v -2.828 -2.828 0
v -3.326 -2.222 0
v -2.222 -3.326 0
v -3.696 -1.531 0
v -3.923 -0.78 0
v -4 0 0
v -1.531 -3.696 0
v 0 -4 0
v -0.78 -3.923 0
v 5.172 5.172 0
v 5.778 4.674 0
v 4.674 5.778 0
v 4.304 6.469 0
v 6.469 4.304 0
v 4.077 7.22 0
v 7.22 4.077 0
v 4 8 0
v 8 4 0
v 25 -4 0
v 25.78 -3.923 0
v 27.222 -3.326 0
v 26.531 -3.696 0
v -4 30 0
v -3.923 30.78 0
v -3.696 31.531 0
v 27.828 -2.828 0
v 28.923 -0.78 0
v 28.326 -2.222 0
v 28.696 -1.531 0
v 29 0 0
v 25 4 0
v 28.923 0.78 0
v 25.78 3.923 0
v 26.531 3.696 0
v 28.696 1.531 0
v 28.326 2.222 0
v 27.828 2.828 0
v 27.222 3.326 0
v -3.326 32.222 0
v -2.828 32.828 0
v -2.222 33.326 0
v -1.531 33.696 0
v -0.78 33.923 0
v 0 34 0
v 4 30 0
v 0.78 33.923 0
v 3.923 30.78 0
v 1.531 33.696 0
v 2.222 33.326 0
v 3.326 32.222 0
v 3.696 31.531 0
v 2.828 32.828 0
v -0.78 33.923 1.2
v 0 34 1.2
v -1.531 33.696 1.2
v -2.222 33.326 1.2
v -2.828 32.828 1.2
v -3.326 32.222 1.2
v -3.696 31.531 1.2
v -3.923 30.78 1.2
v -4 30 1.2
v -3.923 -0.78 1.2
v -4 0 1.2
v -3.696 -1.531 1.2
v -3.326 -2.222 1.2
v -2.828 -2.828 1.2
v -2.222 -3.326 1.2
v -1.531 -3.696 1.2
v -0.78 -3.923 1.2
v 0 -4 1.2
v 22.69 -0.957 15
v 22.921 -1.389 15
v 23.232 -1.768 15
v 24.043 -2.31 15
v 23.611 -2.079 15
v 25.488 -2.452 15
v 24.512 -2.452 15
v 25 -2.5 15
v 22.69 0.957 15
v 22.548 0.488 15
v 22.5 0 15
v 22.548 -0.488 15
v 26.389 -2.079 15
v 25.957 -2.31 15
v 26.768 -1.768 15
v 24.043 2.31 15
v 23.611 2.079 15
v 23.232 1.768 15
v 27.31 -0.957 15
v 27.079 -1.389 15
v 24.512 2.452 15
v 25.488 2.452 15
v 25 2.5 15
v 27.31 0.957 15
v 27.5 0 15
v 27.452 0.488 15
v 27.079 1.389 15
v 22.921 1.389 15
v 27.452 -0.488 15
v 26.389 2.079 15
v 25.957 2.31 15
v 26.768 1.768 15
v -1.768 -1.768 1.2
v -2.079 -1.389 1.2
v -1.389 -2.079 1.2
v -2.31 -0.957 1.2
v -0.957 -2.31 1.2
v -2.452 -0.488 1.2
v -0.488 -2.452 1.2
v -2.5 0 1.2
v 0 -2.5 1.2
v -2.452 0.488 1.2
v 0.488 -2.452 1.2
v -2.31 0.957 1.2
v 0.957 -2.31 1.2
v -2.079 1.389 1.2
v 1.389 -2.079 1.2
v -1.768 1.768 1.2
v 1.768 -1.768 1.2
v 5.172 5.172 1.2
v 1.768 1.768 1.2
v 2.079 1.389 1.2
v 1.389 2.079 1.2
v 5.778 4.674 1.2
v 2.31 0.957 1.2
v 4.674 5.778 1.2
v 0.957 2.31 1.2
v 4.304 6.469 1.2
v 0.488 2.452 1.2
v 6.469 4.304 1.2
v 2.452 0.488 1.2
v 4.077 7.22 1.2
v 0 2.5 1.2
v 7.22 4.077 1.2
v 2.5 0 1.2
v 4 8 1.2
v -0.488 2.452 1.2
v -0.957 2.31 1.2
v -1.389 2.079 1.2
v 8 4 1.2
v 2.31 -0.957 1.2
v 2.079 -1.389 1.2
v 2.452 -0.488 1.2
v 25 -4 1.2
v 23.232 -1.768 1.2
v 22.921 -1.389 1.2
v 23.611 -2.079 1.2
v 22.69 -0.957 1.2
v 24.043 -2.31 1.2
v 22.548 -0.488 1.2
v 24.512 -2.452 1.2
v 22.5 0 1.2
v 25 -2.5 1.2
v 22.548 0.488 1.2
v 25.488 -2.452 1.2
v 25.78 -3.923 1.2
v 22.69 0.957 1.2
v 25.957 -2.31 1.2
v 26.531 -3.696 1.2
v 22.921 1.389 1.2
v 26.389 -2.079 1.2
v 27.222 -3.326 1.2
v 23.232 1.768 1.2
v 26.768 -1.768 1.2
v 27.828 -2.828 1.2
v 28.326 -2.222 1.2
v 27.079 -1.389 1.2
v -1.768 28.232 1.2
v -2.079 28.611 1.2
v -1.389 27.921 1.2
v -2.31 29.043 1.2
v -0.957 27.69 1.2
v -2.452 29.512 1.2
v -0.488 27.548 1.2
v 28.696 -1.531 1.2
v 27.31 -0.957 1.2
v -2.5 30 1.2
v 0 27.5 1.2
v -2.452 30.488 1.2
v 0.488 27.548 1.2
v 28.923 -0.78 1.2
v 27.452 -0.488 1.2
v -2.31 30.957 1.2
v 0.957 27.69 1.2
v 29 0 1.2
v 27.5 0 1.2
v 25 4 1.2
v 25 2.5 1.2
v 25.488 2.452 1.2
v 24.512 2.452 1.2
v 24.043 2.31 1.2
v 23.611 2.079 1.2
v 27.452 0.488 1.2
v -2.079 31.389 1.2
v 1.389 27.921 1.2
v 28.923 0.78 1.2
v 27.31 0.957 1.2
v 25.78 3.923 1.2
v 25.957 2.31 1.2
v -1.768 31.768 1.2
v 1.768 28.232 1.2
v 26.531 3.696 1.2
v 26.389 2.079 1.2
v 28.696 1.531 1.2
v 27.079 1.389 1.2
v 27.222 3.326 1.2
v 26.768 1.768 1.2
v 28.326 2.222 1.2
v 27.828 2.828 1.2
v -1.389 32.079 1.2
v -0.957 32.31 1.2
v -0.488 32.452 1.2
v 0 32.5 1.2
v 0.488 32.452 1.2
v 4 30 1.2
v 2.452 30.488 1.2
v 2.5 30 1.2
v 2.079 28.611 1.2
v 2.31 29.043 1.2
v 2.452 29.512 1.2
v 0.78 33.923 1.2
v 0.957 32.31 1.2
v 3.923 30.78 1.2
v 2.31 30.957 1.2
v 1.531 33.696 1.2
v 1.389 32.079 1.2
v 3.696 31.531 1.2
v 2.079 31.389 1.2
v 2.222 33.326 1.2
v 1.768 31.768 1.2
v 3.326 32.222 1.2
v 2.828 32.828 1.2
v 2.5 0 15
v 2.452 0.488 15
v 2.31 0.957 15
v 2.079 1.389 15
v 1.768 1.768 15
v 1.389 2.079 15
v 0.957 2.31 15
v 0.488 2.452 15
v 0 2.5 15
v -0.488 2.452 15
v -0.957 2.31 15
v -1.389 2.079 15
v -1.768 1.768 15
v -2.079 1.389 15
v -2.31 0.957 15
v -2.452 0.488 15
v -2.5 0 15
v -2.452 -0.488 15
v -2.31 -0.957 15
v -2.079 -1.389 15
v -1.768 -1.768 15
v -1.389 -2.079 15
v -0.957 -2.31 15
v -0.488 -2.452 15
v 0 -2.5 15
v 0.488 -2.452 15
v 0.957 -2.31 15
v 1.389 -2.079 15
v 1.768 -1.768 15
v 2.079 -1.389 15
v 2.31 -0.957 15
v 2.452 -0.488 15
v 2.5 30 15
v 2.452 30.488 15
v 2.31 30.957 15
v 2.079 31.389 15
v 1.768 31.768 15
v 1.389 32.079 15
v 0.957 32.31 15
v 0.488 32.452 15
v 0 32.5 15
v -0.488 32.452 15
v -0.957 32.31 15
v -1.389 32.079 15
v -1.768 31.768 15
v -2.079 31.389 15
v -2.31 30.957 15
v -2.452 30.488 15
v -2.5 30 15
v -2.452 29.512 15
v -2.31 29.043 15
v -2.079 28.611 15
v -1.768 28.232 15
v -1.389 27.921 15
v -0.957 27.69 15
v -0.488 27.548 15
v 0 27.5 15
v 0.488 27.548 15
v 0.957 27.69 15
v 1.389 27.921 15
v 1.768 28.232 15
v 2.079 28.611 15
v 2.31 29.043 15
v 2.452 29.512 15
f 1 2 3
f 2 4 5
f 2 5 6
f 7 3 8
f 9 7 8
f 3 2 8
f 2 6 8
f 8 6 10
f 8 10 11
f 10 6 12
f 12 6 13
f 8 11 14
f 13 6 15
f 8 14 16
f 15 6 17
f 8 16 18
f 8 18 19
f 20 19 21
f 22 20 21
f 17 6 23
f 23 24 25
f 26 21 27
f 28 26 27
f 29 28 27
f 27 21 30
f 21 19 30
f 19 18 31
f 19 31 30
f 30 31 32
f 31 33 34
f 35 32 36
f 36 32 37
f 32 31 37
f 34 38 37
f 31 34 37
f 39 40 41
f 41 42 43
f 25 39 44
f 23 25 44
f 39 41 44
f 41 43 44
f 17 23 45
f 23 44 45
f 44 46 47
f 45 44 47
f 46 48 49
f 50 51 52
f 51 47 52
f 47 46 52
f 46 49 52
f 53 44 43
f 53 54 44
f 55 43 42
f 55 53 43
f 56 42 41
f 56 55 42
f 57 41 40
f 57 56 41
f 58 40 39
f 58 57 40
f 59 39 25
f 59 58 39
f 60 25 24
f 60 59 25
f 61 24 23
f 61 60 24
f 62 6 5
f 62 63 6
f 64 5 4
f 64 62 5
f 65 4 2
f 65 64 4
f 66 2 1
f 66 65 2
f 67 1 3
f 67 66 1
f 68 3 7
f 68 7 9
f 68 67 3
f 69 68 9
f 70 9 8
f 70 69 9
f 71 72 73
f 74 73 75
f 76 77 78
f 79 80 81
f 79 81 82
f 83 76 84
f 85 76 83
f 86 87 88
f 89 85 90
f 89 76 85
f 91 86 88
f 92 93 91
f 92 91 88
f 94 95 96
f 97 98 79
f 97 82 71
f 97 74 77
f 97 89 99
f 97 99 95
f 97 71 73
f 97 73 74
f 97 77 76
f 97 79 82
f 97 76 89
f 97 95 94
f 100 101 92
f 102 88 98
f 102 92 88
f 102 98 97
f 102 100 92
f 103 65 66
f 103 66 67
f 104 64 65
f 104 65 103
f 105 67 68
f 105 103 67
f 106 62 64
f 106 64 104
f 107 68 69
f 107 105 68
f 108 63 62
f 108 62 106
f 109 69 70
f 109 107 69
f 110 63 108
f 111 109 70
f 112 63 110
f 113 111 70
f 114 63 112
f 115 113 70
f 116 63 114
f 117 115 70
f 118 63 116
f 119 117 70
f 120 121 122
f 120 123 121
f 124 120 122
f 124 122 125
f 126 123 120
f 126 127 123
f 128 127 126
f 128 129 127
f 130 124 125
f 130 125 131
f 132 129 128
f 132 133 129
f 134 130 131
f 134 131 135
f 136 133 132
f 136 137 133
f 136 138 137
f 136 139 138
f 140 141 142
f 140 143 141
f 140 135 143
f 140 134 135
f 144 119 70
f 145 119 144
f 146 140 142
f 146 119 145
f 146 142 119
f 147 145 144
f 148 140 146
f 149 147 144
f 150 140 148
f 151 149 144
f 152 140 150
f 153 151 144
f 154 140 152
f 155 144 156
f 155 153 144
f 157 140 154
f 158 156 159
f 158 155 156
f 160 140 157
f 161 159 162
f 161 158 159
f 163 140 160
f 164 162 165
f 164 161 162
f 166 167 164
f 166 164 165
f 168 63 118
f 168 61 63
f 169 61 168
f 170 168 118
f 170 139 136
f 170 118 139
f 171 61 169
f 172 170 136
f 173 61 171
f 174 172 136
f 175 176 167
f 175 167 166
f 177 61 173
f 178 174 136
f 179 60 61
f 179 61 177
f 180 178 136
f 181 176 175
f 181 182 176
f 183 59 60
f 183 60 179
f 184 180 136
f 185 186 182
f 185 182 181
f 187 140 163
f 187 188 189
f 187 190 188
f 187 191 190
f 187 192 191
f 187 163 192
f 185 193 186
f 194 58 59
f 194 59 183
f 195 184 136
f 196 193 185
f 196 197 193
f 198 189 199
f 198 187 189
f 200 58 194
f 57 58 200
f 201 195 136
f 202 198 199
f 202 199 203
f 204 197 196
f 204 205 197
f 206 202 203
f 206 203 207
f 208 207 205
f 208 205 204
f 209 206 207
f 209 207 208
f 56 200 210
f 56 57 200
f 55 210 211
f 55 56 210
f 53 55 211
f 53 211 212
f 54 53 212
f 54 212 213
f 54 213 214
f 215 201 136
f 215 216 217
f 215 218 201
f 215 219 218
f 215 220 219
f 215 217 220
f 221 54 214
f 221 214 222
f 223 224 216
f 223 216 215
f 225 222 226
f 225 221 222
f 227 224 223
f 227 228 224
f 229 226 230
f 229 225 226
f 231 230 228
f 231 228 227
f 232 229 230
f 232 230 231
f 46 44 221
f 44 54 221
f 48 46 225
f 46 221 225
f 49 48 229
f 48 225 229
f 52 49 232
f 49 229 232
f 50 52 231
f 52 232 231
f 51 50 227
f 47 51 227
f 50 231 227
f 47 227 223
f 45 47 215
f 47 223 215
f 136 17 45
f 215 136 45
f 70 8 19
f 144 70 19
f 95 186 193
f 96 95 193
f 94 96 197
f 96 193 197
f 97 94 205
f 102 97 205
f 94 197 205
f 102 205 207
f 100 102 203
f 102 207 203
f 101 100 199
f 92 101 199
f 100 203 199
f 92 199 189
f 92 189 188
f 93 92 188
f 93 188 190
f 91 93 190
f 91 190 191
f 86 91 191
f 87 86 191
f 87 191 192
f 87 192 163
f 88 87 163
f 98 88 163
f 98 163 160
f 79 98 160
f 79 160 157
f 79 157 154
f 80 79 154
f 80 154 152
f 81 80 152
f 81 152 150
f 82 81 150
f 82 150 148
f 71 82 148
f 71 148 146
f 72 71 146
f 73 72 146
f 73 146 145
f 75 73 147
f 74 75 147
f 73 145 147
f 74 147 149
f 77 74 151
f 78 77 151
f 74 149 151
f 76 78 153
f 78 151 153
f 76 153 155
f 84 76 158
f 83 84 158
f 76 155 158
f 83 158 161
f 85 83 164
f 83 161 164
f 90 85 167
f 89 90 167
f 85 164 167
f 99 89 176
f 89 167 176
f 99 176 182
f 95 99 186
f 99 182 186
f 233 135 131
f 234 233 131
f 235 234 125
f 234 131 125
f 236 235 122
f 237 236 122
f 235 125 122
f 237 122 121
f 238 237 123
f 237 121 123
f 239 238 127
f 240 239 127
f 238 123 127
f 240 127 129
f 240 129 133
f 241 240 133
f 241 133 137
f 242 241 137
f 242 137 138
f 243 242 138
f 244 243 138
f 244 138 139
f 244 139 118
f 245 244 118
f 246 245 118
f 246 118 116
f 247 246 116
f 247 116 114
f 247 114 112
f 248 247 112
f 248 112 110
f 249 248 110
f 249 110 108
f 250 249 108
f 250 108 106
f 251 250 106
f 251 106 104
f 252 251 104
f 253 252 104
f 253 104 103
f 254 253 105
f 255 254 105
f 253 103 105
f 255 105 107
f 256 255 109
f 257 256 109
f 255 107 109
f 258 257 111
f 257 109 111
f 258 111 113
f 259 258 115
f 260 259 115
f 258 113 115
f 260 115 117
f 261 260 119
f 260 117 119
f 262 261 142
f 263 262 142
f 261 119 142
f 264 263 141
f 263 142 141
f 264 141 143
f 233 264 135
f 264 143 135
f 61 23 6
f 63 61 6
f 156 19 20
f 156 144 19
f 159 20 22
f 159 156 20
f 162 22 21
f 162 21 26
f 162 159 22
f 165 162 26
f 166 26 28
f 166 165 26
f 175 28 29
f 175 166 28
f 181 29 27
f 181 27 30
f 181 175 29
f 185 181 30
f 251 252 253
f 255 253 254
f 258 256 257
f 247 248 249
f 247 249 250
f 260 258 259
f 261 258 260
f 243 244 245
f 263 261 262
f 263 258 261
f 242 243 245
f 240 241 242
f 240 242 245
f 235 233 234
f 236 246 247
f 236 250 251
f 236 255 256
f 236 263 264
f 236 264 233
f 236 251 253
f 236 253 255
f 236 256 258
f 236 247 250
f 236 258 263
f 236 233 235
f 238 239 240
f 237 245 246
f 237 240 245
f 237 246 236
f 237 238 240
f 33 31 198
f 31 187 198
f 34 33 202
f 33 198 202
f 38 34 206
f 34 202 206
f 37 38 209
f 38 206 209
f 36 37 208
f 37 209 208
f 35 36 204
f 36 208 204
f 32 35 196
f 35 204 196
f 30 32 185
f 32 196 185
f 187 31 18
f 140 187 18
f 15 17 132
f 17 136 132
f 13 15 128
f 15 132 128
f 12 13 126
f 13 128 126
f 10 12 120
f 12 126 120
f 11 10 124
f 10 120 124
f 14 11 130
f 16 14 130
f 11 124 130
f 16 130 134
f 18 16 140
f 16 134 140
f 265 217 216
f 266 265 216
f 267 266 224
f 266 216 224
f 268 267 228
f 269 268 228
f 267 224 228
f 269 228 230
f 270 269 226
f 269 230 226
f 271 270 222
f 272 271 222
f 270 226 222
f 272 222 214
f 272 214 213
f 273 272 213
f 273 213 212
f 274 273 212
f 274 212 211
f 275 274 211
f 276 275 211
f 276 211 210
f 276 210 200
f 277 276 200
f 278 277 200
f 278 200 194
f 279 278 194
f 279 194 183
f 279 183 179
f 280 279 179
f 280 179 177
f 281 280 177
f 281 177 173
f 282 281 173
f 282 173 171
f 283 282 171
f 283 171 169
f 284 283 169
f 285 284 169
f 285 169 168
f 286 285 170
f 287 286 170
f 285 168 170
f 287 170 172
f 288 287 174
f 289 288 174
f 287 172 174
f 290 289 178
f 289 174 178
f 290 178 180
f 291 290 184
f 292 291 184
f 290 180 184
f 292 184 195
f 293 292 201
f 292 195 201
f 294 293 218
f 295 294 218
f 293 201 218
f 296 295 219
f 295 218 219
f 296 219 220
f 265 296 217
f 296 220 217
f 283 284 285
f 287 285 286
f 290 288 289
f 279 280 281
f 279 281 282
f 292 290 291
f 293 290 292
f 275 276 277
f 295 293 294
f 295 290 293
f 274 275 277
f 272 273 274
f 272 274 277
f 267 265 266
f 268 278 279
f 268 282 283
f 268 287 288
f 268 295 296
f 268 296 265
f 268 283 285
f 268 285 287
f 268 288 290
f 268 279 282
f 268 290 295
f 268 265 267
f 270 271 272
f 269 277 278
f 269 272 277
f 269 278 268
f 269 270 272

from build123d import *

# Parameters (mm, degrees)
F0_R     = 2.5
F1_DEPTH = 1.2
F2_DEPTH = 15
F3_R     = 3.99999


# Not quite as in the source:
# - a fillet or chamfer is up to 0.001 mm smaller than in the source, because OpenCascade refuses the exact size


with BuildPart() as f1:
    # F0 (on Top) → F1 (new body)
    with BuildSketch(Plane.XY):
        Polygon((4, 34), (-4, 34), (-4, -4), (29, -4), (29, 4), (4, 4), align=None)
        Circle(F0_R, mode=Mode.SUBTRACT)
        with Locations((25, 0)):
            Circle(F0_R, mode=Mode.SUBTRACT)
        with Locations((0, 30)):
            Circle(F0_R, mode=Mode.SUBTRACT)
    extrude(amount=F1_DEPTH)

    # F0 (on Top) → F2 (join)
    with BuildSketch(Plane.XY):
        Circle(F0_R)
        with Locations((25, 0)):
            Circle(F0_R)
        with Locations((0, 30)):
            Circle(F0_R)
    extrude(amount=F2_DEPTH)

    # F3 (radius 4 in the source; OpenCascade refuses exactly that, so slightly less here)
    f3_edges = [f1.edges().sort_by_distance(p)[0] for p in [
        (4, 4, 0.6),
        (29, 4, 0.6),
        (29, -4, 0.6),
        (-4, -4, 0.6),
        (-4, 34, 0.6),
        (4, 34, 0.6),
    ]]
    fillet(f3_edges, radius=F3_R)


solid = f1.part
